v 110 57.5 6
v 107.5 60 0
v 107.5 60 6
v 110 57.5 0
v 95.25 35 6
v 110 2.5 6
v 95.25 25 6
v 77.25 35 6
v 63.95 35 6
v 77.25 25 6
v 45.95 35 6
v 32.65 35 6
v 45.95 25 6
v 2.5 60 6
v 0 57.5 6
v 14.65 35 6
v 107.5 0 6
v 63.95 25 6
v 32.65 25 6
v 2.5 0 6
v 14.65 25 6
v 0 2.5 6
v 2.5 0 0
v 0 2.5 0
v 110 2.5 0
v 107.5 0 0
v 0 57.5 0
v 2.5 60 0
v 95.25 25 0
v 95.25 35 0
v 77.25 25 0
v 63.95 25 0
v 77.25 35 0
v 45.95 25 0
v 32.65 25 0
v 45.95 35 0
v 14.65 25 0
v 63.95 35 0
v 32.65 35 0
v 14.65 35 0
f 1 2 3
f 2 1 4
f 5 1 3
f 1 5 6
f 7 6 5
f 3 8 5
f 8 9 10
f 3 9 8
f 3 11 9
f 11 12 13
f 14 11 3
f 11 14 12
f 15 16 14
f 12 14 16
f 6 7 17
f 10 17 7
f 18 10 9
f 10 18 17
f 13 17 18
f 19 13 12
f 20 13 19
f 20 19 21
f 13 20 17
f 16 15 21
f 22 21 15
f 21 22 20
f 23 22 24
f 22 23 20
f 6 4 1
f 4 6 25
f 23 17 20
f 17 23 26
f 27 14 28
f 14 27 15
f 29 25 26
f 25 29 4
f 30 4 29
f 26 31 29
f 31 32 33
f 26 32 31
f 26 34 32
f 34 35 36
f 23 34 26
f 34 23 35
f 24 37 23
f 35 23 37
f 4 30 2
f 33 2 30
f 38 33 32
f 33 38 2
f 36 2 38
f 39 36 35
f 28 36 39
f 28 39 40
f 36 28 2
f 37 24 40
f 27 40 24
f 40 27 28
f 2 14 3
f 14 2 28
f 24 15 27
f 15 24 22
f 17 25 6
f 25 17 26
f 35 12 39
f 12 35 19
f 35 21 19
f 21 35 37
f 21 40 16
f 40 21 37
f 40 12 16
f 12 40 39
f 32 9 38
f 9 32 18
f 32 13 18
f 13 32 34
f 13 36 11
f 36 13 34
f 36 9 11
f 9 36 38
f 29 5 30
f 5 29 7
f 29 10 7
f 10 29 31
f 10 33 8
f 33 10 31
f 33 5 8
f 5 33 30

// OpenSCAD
$fn = 32;

// ----------------------------------------------------------------------
// Windowed plate: 3 voids, 110 x 60 x 6 mm
// ----------------------------------------------------------------------

// --- parameters (mm) ---
plate_l = 110;            // plate length, X
plate_w = 60;             // plate width, Y
plate_t = 6;              // plate thickness, Z
edge_margin = 8;          // wall from the plate edge to any window
windows = 3;              // number of windows in the row
win_l = 18;               // window length
win_w = 10;               // window width
win_pitch = 31.3;         // window pitch along X
depth_1 = 6;              // depth of void 1 (full thickness = through)
depth_2 = 6;              // depth of void 2 (full thickness = through)
depth_3 = 6;              // depth of void 3 (full thickness = through)
corner_c = 2.5;           // corner chamfer of the plate

profile = [[2.5, 0], [107.5, 0], [110, 2.5], [110, 57.5], [107.5, 60], [2.5, 60], [0, 57.5], [0, 2.5]];  // primary outline, 8 points, counter clockwise
void_1 = [[14.65, 25], [32.65, 25], [32.65, 35], [14.65, 35]];  // window 1 of the row, 4 points
void_2 = [[45.95, 25], [63.95, 25], [63.95, 35], [45.95, 35]];  // window 2 of the row, 4 points
void_3 = [[77.25, 25], [95.25, 25], [95.25, 35], [77.25, 35]];  // window 3 of the row, 4 points

// --- the one profile operation ---
difference() {
  linear_extrude(height = plate_t) polygon(points = profile);
  translate([0, 0, -1])
    linear_extrude(height = plate_t + 2) polygon(points = void_1);
  translate([0, 0, -1])
    linear_extrude(height = plate_t + 2) polygon(points = void_2);
  translate([0, 0, -1])
    linear_extrude(height = plate_t + 2) polygon(points = void_3);
}
